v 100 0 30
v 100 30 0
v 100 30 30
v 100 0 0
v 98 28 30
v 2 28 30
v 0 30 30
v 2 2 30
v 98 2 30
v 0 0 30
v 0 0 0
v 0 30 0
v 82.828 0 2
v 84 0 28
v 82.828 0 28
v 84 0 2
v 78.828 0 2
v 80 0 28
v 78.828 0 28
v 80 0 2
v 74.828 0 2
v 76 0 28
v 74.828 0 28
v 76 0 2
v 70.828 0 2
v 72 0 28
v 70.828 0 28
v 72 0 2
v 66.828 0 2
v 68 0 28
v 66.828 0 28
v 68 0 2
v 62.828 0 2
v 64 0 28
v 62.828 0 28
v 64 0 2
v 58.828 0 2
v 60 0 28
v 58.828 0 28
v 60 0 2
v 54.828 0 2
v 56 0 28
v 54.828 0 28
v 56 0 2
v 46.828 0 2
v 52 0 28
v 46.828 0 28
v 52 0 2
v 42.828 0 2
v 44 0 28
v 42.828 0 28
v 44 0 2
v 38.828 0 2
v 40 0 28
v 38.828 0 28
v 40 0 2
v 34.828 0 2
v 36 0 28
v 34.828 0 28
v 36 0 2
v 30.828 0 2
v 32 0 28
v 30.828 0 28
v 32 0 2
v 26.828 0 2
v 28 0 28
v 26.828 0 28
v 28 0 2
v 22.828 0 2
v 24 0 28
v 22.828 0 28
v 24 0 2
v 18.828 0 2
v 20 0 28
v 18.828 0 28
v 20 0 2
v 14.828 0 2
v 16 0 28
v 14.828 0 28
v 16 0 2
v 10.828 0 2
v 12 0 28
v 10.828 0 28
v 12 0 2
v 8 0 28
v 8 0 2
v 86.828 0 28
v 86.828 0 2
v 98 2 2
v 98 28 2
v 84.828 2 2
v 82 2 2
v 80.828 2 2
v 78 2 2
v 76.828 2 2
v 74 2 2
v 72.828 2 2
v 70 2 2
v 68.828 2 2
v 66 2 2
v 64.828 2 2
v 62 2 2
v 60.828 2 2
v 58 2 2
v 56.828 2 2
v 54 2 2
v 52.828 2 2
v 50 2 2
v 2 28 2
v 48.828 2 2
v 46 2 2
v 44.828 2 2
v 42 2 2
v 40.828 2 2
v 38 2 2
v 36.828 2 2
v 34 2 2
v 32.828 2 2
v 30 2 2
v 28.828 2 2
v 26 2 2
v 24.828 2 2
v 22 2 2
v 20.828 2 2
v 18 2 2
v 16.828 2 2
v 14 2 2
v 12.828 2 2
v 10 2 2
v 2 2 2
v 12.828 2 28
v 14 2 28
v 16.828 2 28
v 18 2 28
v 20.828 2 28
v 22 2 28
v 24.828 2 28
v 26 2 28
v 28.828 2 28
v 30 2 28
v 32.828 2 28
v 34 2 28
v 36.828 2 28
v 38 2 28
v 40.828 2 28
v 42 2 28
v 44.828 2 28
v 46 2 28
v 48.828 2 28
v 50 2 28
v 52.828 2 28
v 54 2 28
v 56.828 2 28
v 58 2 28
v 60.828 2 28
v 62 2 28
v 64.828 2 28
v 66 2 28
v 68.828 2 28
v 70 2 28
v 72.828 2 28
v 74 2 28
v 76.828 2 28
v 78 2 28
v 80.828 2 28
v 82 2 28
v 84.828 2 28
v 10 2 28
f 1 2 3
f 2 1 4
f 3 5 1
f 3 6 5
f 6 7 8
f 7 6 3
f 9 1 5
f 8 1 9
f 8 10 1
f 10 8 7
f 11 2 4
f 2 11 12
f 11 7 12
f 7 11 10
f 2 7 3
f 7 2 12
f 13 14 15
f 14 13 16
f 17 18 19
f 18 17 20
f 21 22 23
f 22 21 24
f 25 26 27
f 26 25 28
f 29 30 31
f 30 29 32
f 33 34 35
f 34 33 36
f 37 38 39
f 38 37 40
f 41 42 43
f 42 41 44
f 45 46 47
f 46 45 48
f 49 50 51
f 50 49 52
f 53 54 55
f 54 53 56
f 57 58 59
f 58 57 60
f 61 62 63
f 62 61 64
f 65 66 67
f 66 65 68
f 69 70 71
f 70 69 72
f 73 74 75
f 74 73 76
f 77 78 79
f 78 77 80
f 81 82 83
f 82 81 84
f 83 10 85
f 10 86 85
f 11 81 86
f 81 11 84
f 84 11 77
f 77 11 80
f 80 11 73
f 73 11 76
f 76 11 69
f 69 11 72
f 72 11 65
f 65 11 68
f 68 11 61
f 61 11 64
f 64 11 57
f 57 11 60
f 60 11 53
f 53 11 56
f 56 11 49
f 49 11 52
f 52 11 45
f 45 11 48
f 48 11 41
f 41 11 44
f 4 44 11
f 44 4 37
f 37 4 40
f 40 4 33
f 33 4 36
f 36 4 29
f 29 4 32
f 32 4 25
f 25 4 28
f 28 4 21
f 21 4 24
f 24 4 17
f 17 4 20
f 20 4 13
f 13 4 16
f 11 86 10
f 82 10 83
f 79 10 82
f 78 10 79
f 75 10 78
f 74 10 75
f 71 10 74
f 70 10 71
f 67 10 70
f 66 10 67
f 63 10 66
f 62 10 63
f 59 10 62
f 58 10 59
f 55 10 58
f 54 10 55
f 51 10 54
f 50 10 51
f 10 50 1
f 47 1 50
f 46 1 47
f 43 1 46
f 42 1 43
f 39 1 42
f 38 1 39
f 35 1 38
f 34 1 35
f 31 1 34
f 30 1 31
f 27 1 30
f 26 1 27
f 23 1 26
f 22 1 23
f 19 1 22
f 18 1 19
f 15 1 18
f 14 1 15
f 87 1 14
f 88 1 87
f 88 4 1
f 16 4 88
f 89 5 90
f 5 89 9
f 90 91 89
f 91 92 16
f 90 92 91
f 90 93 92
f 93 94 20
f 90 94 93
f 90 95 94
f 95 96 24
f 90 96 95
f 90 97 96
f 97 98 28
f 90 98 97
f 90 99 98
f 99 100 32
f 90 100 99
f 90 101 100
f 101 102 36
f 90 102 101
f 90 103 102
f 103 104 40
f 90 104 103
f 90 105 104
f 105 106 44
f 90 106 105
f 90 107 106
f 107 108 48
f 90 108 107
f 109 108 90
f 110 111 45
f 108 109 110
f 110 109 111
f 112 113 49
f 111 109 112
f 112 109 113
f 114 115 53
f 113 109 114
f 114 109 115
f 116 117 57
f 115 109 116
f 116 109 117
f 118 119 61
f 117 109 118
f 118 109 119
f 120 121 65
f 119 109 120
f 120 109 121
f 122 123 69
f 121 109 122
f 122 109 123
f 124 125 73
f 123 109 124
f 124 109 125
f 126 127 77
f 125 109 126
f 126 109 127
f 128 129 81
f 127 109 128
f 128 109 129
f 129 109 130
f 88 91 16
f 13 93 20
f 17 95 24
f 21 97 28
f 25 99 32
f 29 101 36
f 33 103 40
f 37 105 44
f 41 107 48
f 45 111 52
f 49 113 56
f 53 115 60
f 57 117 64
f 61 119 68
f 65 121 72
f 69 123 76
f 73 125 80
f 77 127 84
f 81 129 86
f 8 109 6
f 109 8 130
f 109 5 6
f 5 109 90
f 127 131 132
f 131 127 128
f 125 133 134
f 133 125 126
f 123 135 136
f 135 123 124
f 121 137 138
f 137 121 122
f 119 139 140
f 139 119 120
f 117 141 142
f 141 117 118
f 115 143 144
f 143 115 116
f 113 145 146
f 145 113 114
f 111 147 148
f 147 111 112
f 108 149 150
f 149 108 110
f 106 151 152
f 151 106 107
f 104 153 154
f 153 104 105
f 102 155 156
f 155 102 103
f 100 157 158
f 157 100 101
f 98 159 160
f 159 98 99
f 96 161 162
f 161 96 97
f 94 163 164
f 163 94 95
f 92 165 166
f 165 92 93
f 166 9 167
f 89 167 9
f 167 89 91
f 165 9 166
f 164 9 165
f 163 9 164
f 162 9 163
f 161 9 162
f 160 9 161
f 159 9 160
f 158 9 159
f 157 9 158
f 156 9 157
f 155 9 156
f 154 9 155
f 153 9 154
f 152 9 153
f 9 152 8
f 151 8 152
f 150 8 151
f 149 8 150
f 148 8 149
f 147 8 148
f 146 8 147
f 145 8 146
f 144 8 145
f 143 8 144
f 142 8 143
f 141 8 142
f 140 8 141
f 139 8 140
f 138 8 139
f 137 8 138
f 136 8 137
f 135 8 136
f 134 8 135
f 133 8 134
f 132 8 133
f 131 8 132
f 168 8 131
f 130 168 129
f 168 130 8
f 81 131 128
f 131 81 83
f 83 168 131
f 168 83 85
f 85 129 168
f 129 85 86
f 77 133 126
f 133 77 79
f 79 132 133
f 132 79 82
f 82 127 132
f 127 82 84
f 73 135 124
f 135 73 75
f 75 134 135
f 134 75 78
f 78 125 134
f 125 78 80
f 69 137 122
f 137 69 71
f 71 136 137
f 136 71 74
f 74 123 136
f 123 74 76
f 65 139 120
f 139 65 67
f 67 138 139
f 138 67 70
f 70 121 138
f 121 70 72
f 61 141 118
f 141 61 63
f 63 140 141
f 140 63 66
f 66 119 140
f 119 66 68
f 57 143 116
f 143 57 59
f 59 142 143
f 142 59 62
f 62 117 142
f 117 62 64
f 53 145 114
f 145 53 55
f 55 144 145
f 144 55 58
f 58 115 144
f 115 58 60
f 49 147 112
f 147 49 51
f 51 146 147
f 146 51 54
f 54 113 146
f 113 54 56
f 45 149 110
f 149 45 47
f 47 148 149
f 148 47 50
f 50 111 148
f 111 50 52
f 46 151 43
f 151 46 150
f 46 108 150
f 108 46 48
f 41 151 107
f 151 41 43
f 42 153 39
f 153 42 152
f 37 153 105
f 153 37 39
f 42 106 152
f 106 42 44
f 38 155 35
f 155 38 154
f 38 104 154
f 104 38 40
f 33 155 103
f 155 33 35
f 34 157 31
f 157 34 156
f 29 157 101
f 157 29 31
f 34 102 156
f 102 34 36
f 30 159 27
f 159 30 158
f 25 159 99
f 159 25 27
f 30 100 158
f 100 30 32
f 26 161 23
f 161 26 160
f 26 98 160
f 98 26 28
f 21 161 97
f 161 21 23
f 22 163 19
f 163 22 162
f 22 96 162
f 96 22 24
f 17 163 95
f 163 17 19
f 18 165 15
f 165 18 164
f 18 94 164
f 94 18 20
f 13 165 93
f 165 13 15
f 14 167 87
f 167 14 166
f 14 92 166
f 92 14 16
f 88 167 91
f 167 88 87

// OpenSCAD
thickness = 2;
width = 100;
height = 30;
depth = 30;
difference() {
    difference() {
        cube([width,height,depth]);
       translate([thickness,thickness,thickness]) cube([width-(2*thickness),depth-(2*thickness),height + thickness]);
    }
    for ( i = [thickness * 2 : 2 * thickness : width/2 - (5 * thickness)] ) {
        translate([i,(thickness * -2),thickness]) rotate(-45,0,0) cube([thickness,depth/2,(height-(2 * thickness))]);
    }
    for ( i = [ width/2 + (3 * thickness) : 2 * thickness : width - (5 * thickness)] ) {
        translate([i,(thickness * -2),thickness]) rotate(45,0,0) cube([thickness,depth/2,(height-(2 * thickness))]);
    }
}
